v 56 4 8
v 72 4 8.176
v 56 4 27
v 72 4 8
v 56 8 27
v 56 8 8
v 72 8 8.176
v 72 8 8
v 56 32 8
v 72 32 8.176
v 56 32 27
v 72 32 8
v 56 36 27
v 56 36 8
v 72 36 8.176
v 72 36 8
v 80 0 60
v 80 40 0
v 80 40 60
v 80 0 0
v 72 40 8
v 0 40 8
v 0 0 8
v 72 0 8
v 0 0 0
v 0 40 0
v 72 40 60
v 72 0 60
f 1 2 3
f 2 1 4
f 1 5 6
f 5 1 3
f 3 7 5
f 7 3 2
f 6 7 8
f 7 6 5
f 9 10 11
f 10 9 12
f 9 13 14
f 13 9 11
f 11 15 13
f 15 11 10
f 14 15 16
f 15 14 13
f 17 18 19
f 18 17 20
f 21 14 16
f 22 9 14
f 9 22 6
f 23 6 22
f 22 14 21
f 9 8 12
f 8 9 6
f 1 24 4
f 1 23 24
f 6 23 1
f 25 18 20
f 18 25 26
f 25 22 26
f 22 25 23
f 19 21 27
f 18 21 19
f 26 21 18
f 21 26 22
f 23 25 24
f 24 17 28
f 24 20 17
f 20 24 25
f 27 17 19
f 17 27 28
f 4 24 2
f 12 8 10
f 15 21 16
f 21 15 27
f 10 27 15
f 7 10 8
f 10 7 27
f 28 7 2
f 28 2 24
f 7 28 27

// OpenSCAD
$fn = 32;

// ----------------------------------------------------------------------
// Rib bracket: 2-gusset L bracket
// ----------------------------------------------------------------------

// --- parameters (mm) ---
base_l = 80;              // foot length, X
base_w = 40;              // foot width, Y
base_t = 8;               // foot thickness
plate_t = 8;              // upright plate thickness
plate_h = 60;             // overall height
gus_l = 16;               // gusset leg along the foot
gus_h = 20;               // gusset height
gus_t = 4;                // gusset thickness
gus_edge = 4;             // gusset margin from the foot edge
n_gus = 2;                // gusset count

gus_pitch = (base_w - 2 * gus_edge - gus_t) / (n_gus - 1);  // gusset pitch

union() {
  cube([base_l, base_w, base_t]);
  translate([base_l - plate_t, 0, base_t - 1])
    cube([plate_t, base_w, plate_h - base_t + 1]);
  for (i = [0 : n_gus - 1])
    translate([base_l - plate_t - gus_l, gus_edge + i * gus_pitch, base_t - 1])
      rotate([-90, 0, 0])
        linear_extrude(height = gus_t)
          polygon(points = [[0, 0], [gus_l + 1, 0], [0, -gus_h]]);
}
